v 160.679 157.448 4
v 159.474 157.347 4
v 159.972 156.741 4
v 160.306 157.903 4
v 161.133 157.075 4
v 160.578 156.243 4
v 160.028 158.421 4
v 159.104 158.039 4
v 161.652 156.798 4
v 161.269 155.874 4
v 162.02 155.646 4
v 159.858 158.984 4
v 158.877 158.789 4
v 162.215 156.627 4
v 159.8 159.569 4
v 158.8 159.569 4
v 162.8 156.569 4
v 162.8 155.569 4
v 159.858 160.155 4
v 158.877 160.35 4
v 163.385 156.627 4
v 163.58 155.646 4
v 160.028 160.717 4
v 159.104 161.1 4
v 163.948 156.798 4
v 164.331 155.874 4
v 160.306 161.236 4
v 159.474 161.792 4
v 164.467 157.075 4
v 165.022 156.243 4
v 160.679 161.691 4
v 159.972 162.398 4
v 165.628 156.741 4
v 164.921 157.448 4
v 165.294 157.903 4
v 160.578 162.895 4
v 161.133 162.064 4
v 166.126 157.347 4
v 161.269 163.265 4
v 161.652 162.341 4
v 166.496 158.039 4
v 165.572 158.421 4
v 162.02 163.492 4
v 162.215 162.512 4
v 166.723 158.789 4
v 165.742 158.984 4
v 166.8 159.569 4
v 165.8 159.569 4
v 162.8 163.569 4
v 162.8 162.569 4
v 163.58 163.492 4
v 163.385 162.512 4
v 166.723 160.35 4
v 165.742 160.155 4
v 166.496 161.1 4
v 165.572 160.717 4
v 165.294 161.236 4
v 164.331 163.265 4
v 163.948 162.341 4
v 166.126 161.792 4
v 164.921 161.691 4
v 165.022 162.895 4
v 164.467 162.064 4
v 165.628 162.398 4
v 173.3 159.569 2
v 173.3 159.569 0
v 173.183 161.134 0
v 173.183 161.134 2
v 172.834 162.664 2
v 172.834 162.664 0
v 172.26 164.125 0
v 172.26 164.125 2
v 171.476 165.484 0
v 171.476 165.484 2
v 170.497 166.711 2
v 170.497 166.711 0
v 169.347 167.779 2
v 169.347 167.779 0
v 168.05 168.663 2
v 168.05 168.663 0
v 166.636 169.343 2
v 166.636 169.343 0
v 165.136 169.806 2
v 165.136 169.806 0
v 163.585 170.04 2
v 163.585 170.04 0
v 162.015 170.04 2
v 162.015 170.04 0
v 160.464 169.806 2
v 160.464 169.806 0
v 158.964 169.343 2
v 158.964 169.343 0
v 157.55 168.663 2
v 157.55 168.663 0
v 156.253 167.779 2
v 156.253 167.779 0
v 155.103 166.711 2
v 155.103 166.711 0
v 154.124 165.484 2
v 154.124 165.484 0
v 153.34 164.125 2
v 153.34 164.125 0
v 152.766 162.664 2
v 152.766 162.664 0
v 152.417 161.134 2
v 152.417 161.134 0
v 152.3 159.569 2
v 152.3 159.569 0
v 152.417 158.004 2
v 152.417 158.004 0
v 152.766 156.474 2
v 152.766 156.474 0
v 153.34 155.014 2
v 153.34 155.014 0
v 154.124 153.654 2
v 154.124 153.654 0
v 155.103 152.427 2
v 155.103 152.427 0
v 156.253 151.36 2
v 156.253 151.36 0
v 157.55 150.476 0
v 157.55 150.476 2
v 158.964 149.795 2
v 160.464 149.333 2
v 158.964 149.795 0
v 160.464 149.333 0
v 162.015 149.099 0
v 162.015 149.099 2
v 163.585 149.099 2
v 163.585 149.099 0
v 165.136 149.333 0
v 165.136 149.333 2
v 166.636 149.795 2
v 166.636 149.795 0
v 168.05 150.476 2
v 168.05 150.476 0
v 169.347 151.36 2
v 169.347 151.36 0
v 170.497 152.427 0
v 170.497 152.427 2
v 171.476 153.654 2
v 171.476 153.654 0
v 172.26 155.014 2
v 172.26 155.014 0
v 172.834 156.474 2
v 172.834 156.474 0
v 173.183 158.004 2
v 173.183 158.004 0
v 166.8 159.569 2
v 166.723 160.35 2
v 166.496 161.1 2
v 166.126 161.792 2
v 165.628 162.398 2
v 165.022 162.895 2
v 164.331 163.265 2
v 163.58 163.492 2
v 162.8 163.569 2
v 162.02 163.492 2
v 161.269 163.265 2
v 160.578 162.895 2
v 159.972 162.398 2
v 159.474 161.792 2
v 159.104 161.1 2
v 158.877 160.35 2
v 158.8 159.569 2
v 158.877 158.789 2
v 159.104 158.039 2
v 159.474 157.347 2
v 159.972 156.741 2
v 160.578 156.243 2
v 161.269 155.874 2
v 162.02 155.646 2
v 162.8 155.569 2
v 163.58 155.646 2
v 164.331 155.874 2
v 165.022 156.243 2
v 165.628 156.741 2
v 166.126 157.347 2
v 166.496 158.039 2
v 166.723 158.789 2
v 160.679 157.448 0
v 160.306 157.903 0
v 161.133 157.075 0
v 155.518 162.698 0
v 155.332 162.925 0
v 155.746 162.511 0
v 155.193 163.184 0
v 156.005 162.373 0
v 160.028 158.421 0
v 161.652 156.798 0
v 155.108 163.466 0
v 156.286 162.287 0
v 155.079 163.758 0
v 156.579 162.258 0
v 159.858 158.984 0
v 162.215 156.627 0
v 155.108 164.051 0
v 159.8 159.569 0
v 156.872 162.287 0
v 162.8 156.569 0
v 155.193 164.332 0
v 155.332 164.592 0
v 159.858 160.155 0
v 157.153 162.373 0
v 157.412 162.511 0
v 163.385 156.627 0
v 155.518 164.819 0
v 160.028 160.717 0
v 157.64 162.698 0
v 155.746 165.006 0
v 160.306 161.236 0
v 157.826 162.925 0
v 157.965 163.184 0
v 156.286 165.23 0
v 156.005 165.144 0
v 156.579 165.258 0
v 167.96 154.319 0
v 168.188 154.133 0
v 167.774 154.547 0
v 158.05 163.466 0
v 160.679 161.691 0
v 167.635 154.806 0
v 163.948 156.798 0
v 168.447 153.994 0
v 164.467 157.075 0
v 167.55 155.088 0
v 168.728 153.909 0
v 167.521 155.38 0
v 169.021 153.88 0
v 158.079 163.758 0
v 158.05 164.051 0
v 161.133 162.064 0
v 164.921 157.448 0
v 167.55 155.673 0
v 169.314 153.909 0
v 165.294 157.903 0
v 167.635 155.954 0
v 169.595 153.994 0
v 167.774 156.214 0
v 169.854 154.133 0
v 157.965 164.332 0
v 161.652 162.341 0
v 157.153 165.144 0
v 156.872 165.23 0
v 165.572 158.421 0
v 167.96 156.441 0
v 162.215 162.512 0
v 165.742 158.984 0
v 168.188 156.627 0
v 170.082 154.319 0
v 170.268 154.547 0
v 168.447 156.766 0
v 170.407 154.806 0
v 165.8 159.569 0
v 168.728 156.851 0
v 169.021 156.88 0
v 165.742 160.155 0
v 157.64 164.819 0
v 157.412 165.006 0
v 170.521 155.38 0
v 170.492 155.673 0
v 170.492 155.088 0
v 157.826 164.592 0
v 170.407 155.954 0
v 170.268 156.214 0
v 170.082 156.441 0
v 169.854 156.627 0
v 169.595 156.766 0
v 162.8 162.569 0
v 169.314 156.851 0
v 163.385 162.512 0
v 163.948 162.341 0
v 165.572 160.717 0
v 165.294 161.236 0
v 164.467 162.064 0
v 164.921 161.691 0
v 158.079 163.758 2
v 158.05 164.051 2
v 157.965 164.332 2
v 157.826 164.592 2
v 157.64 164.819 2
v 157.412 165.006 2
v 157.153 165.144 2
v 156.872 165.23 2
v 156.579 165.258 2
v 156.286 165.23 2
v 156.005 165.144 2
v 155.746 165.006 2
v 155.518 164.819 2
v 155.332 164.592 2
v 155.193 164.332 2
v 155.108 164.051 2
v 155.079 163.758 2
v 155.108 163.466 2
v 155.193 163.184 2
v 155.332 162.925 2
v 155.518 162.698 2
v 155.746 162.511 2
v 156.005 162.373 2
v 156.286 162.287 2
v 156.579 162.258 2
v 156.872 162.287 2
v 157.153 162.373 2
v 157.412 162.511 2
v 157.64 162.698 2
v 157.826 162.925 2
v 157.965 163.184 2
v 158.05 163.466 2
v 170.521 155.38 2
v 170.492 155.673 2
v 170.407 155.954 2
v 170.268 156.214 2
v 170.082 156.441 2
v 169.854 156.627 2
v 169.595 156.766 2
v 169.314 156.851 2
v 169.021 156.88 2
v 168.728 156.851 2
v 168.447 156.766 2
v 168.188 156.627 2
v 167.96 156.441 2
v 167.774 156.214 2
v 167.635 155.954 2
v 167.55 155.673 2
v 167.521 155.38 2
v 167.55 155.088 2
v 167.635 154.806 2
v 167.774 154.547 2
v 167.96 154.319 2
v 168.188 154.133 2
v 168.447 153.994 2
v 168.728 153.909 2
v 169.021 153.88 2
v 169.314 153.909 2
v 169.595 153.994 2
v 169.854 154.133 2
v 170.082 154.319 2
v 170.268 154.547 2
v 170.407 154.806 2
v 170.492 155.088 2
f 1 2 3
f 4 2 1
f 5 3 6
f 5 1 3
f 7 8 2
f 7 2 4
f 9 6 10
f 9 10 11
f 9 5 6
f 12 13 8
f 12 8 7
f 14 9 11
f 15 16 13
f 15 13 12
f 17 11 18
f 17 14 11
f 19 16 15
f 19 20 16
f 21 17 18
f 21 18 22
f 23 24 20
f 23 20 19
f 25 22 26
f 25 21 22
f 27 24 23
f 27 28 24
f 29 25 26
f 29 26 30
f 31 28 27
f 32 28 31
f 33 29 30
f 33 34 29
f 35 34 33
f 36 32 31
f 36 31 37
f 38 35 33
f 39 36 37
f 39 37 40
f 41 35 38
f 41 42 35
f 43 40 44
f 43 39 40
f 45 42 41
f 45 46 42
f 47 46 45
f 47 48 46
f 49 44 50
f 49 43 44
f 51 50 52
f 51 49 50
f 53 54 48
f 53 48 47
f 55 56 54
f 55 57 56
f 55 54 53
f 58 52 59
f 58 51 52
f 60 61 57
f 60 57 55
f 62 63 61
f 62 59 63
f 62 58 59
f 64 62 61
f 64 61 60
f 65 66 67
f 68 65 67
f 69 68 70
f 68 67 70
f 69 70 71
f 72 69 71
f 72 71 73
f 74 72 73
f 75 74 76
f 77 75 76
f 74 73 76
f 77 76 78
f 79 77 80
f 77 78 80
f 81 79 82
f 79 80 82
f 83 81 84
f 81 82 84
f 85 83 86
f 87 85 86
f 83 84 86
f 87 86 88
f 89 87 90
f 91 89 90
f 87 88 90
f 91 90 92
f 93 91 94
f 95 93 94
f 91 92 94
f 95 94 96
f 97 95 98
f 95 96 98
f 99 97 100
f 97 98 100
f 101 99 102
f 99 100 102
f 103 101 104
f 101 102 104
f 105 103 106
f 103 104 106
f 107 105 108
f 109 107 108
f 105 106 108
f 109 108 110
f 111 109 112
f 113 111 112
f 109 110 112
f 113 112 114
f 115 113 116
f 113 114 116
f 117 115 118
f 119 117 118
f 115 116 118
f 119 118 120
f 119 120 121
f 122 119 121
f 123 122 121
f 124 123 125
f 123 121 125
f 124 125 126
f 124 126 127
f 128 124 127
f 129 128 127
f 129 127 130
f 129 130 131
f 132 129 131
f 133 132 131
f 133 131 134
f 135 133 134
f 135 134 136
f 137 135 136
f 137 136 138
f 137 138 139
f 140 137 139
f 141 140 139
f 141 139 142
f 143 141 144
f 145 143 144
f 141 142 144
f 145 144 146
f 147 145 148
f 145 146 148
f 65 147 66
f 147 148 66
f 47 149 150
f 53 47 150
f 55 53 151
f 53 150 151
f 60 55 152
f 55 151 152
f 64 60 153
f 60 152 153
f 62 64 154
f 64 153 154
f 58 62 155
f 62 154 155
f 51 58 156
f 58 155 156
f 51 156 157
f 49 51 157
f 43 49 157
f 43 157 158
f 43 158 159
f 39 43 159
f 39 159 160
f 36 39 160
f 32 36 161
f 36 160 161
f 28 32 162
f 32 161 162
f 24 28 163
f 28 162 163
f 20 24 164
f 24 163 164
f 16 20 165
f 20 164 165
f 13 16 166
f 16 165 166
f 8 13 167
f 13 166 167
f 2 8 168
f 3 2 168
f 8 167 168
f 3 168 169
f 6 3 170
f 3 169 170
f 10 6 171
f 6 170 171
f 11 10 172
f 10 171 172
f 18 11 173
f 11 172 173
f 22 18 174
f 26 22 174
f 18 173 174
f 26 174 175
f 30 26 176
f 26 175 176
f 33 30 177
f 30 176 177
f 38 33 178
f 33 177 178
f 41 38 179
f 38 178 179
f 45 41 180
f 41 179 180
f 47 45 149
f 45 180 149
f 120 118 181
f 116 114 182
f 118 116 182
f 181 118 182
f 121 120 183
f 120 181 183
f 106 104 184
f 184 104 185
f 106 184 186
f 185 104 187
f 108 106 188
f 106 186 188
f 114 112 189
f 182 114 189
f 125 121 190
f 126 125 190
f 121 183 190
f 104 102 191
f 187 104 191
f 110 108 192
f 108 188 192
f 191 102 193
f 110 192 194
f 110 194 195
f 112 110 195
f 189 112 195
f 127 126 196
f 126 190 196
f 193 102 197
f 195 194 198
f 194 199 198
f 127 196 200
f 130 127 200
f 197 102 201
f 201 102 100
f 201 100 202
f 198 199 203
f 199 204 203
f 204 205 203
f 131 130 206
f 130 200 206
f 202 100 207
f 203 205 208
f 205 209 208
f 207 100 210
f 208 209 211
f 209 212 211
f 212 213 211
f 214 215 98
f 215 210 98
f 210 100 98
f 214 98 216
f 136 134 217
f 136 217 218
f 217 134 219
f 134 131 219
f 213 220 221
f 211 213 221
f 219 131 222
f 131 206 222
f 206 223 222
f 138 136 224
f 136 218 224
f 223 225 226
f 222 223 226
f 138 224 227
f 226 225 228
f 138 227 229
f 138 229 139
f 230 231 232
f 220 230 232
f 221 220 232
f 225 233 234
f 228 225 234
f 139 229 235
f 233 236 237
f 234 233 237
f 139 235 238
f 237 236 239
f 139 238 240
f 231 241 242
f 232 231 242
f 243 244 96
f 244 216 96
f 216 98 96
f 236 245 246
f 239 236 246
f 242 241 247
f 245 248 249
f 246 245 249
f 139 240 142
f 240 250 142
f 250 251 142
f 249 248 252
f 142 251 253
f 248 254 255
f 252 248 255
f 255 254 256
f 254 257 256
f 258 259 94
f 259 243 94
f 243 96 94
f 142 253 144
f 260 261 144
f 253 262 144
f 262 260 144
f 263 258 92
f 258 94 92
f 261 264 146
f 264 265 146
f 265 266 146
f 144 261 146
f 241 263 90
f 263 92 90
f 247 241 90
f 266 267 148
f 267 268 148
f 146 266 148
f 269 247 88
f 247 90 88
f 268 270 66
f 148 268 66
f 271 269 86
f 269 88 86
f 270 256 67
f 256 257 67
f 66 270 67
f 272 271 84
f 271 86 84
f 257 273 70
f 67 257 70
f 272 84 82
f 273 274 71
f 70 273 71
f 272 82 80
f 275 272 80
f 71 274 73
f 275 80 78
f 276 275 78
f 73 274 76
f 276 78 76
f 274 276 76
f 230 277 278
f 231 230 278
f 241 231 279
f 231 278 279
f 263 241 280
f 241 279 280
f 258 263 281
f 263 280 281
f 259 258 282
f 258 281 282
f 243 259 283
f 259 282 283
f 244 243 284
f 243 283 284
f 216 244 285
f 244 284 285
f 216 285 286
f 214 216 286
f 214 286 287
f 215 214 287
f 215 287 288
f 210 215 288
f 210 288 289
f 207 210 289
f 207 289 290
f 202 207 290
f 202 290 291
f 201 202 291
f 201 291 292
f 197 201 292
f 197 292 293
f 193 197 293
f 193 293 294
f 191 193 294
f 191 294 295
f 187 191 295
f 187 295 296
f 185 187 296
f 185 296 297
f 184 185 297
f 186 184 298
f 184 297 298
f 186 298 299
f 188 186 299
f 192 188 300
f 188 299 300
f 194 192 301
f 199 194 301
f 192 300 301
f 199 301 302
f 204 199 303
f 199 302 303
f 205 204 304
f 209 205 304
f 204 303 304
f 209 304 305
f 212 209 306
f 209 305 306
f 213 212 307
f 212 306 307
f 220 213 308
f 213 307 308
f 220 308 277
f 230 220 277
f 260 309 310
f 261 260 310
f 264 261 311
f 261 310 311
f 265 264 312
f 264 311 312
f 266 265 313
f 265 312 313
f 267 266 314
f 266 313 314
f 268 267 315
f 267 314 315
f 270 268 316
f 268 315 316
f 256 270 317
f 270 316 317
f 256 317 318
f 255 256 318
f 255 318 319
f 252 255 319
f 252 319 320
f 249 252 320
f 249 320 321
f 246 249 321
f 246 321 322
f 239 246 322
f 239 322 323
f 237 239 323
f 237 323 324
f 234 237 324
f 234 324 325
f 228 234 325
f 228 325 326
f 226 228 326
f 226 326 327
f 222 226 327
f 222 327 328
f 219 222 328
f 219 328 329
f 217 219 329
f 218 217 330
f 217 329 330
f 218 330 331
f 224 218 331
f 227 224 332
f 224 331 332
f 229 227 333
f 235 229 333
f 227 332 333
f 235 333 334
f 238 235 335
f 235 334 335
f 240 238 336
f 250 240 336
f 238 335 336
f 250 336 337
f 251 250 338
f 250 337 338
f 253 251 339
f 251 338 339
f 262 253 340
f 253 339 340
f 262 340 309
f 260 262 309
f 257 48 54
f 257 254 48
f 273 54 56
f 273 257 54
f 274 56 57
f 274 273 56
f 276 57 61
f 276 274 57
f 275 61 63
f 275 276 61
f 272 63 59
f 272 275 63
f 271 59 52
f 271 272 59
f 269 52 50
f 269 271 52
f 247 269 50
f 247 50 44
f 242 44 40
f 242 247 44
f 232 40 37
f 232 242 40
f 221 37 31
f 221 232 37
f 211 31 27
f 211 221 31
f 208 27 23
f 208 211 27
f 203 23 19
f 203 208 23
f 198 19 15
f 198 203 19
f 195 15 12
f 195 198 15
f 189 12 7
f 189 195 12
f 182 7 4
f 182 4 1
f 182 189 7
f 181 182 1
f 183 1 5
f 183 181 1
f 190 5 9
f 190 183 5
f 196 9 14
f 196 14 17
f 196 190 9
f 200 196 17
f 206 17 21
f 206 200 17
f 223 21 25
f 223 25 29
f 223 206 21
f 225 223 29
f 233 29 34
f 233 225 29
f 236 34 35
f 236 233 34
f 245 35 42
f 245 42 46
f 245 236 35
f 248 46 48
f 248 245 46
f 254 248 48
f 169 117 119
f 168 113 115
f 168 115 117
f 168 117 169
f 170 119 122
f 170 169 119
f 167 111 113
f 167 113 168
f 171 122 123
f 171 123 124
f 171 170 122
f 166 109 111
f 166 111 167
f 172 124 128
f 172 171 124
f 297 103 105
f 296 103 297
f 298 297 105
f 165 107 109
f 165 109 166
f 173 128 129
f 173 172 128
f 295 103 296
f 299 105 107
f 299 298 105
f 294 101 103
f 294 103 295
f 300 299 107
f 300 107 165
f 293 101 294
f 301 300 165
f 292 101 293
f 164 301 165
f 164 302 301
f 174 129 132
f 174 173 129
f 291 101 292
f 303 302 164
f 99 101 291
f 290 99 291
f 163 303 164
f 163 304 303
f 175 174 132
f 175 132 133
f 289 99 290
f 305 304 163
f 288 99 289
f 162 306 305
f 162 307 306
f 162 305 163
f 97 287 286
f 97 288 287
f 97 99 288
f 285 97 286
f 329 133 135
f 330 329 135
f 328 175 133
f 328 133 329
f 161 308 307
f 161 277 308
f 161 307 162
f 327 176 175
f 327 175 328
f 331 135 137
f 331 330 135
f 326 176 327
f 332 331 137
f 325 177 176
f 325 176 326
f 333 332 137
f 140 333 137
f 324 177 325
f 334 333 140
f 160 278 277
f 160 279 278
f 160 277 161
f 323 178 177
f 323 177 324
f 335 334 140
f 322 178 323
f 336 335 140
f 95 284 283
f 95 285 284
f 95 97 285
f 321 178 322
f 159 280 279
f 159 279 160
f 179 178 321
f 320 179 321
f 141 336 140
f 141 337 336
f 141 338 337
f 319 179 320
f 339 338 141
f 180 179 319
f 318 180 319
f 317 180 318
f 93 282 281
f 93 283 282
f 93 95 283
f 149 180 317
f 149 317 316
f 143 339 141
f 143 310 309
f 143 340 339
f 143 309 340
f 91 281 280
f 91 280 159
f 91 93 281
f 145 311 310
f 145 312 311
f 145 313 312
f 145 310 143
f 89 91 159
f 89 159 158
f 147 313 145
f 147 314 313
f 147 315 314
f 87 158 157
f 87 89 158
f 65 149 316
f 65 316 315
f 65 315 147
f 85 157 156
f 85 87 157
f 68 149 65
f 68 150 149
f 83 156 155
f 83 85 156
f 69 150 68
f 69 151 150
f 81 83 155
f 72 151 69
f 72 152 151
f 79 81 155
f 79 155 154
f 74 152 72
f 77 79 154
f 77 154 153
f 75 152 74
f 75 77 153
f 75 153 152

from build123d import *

# Parameters (mm, degrees)
MODEL_R                 = 10.5
MODEL_R_2               = 3
SALIENTE_EXTRUIR1_DEPTH = 2
CORTAR_EXTRUIR1_REACH   = 4
CROQUIS2_R              = 1.5
CROQUIS3_R              = 4.000000302
CROQUIS3_R_2            = 3
SALIENTE_EXTRUIR2_DEPTH = 2


with BuildPart() as part:
    # Model → Saliente-Extruir1 (new body)
    with BuildSketch(Plane.XY):
        with Locations((162.8, 159.569296)):
            Circle(MODEL_R)
        with Locations((162.8, 159.569296)):
            Circle(MODEL_R_2, mode=Mode.SUBTRACT)
    extrude(amount=SALIENTE_EXTRUIR1_DEPTH)

    # Croquis2 → Cortar-Extruir1 (cut, up to next)
    with BuildSketch(Plane.XY.offset(2), mode=Mode.PRIVATE) as cortar_extruir1_sk1:
        with Locations((156.57897681, 163.758432659)):
            Circle(CROQUIS2_R)
    cortar_extruir1_tool1 = extrude(cortar_extruir1_sk1.sketch, amount=-CORTAR_EXTRUIR1_REACH, mode=Mode.PRIVATE) & part.part
    add(cortar_extruir1_tool1.solids().sort_by_distance((156.578977, 163.758433, 2))[0], mode=Mode.SUBTRACT)
    # Croquis2 → Cortar-Extruir1 (cut, up to next)
    with BuildSketch(Plane.XY.offset(2), mode=Mode.PRIVATE) as cortar_extruir1_sk2:
        with Locations((169.021023816, 155.380159191)):
            Circle(CROQUIS2_R)
    cortar_extruir1_tool2 = extrude(cortar_extruir1_sk2.sketch, amount=-CORTAR_EXTRUIR1_REACH, mode=Mode.PRIVATE) & part.part
    add(cortar_extruir1_tool2.solids().sort_by_distance((169.021024, 155.380159, 2))[0], mode=Mode.SUBTRACT)

    # Croquis3 → Saliente-Extruir2 (add)
    with BuildSketch(Plane.XY.offset(2)):
        with Locations((162.8, 159.569296)):
            Circle(CROQUIS3_R)
        with Locations((162.8, 159.569296)):
            Circle(CROQUIS3_R_2, mode=Mode.SUBTRACT)
    extrude(amount=SALIENTE_EXTRUIR2_DEPTH)


solid = part.part
